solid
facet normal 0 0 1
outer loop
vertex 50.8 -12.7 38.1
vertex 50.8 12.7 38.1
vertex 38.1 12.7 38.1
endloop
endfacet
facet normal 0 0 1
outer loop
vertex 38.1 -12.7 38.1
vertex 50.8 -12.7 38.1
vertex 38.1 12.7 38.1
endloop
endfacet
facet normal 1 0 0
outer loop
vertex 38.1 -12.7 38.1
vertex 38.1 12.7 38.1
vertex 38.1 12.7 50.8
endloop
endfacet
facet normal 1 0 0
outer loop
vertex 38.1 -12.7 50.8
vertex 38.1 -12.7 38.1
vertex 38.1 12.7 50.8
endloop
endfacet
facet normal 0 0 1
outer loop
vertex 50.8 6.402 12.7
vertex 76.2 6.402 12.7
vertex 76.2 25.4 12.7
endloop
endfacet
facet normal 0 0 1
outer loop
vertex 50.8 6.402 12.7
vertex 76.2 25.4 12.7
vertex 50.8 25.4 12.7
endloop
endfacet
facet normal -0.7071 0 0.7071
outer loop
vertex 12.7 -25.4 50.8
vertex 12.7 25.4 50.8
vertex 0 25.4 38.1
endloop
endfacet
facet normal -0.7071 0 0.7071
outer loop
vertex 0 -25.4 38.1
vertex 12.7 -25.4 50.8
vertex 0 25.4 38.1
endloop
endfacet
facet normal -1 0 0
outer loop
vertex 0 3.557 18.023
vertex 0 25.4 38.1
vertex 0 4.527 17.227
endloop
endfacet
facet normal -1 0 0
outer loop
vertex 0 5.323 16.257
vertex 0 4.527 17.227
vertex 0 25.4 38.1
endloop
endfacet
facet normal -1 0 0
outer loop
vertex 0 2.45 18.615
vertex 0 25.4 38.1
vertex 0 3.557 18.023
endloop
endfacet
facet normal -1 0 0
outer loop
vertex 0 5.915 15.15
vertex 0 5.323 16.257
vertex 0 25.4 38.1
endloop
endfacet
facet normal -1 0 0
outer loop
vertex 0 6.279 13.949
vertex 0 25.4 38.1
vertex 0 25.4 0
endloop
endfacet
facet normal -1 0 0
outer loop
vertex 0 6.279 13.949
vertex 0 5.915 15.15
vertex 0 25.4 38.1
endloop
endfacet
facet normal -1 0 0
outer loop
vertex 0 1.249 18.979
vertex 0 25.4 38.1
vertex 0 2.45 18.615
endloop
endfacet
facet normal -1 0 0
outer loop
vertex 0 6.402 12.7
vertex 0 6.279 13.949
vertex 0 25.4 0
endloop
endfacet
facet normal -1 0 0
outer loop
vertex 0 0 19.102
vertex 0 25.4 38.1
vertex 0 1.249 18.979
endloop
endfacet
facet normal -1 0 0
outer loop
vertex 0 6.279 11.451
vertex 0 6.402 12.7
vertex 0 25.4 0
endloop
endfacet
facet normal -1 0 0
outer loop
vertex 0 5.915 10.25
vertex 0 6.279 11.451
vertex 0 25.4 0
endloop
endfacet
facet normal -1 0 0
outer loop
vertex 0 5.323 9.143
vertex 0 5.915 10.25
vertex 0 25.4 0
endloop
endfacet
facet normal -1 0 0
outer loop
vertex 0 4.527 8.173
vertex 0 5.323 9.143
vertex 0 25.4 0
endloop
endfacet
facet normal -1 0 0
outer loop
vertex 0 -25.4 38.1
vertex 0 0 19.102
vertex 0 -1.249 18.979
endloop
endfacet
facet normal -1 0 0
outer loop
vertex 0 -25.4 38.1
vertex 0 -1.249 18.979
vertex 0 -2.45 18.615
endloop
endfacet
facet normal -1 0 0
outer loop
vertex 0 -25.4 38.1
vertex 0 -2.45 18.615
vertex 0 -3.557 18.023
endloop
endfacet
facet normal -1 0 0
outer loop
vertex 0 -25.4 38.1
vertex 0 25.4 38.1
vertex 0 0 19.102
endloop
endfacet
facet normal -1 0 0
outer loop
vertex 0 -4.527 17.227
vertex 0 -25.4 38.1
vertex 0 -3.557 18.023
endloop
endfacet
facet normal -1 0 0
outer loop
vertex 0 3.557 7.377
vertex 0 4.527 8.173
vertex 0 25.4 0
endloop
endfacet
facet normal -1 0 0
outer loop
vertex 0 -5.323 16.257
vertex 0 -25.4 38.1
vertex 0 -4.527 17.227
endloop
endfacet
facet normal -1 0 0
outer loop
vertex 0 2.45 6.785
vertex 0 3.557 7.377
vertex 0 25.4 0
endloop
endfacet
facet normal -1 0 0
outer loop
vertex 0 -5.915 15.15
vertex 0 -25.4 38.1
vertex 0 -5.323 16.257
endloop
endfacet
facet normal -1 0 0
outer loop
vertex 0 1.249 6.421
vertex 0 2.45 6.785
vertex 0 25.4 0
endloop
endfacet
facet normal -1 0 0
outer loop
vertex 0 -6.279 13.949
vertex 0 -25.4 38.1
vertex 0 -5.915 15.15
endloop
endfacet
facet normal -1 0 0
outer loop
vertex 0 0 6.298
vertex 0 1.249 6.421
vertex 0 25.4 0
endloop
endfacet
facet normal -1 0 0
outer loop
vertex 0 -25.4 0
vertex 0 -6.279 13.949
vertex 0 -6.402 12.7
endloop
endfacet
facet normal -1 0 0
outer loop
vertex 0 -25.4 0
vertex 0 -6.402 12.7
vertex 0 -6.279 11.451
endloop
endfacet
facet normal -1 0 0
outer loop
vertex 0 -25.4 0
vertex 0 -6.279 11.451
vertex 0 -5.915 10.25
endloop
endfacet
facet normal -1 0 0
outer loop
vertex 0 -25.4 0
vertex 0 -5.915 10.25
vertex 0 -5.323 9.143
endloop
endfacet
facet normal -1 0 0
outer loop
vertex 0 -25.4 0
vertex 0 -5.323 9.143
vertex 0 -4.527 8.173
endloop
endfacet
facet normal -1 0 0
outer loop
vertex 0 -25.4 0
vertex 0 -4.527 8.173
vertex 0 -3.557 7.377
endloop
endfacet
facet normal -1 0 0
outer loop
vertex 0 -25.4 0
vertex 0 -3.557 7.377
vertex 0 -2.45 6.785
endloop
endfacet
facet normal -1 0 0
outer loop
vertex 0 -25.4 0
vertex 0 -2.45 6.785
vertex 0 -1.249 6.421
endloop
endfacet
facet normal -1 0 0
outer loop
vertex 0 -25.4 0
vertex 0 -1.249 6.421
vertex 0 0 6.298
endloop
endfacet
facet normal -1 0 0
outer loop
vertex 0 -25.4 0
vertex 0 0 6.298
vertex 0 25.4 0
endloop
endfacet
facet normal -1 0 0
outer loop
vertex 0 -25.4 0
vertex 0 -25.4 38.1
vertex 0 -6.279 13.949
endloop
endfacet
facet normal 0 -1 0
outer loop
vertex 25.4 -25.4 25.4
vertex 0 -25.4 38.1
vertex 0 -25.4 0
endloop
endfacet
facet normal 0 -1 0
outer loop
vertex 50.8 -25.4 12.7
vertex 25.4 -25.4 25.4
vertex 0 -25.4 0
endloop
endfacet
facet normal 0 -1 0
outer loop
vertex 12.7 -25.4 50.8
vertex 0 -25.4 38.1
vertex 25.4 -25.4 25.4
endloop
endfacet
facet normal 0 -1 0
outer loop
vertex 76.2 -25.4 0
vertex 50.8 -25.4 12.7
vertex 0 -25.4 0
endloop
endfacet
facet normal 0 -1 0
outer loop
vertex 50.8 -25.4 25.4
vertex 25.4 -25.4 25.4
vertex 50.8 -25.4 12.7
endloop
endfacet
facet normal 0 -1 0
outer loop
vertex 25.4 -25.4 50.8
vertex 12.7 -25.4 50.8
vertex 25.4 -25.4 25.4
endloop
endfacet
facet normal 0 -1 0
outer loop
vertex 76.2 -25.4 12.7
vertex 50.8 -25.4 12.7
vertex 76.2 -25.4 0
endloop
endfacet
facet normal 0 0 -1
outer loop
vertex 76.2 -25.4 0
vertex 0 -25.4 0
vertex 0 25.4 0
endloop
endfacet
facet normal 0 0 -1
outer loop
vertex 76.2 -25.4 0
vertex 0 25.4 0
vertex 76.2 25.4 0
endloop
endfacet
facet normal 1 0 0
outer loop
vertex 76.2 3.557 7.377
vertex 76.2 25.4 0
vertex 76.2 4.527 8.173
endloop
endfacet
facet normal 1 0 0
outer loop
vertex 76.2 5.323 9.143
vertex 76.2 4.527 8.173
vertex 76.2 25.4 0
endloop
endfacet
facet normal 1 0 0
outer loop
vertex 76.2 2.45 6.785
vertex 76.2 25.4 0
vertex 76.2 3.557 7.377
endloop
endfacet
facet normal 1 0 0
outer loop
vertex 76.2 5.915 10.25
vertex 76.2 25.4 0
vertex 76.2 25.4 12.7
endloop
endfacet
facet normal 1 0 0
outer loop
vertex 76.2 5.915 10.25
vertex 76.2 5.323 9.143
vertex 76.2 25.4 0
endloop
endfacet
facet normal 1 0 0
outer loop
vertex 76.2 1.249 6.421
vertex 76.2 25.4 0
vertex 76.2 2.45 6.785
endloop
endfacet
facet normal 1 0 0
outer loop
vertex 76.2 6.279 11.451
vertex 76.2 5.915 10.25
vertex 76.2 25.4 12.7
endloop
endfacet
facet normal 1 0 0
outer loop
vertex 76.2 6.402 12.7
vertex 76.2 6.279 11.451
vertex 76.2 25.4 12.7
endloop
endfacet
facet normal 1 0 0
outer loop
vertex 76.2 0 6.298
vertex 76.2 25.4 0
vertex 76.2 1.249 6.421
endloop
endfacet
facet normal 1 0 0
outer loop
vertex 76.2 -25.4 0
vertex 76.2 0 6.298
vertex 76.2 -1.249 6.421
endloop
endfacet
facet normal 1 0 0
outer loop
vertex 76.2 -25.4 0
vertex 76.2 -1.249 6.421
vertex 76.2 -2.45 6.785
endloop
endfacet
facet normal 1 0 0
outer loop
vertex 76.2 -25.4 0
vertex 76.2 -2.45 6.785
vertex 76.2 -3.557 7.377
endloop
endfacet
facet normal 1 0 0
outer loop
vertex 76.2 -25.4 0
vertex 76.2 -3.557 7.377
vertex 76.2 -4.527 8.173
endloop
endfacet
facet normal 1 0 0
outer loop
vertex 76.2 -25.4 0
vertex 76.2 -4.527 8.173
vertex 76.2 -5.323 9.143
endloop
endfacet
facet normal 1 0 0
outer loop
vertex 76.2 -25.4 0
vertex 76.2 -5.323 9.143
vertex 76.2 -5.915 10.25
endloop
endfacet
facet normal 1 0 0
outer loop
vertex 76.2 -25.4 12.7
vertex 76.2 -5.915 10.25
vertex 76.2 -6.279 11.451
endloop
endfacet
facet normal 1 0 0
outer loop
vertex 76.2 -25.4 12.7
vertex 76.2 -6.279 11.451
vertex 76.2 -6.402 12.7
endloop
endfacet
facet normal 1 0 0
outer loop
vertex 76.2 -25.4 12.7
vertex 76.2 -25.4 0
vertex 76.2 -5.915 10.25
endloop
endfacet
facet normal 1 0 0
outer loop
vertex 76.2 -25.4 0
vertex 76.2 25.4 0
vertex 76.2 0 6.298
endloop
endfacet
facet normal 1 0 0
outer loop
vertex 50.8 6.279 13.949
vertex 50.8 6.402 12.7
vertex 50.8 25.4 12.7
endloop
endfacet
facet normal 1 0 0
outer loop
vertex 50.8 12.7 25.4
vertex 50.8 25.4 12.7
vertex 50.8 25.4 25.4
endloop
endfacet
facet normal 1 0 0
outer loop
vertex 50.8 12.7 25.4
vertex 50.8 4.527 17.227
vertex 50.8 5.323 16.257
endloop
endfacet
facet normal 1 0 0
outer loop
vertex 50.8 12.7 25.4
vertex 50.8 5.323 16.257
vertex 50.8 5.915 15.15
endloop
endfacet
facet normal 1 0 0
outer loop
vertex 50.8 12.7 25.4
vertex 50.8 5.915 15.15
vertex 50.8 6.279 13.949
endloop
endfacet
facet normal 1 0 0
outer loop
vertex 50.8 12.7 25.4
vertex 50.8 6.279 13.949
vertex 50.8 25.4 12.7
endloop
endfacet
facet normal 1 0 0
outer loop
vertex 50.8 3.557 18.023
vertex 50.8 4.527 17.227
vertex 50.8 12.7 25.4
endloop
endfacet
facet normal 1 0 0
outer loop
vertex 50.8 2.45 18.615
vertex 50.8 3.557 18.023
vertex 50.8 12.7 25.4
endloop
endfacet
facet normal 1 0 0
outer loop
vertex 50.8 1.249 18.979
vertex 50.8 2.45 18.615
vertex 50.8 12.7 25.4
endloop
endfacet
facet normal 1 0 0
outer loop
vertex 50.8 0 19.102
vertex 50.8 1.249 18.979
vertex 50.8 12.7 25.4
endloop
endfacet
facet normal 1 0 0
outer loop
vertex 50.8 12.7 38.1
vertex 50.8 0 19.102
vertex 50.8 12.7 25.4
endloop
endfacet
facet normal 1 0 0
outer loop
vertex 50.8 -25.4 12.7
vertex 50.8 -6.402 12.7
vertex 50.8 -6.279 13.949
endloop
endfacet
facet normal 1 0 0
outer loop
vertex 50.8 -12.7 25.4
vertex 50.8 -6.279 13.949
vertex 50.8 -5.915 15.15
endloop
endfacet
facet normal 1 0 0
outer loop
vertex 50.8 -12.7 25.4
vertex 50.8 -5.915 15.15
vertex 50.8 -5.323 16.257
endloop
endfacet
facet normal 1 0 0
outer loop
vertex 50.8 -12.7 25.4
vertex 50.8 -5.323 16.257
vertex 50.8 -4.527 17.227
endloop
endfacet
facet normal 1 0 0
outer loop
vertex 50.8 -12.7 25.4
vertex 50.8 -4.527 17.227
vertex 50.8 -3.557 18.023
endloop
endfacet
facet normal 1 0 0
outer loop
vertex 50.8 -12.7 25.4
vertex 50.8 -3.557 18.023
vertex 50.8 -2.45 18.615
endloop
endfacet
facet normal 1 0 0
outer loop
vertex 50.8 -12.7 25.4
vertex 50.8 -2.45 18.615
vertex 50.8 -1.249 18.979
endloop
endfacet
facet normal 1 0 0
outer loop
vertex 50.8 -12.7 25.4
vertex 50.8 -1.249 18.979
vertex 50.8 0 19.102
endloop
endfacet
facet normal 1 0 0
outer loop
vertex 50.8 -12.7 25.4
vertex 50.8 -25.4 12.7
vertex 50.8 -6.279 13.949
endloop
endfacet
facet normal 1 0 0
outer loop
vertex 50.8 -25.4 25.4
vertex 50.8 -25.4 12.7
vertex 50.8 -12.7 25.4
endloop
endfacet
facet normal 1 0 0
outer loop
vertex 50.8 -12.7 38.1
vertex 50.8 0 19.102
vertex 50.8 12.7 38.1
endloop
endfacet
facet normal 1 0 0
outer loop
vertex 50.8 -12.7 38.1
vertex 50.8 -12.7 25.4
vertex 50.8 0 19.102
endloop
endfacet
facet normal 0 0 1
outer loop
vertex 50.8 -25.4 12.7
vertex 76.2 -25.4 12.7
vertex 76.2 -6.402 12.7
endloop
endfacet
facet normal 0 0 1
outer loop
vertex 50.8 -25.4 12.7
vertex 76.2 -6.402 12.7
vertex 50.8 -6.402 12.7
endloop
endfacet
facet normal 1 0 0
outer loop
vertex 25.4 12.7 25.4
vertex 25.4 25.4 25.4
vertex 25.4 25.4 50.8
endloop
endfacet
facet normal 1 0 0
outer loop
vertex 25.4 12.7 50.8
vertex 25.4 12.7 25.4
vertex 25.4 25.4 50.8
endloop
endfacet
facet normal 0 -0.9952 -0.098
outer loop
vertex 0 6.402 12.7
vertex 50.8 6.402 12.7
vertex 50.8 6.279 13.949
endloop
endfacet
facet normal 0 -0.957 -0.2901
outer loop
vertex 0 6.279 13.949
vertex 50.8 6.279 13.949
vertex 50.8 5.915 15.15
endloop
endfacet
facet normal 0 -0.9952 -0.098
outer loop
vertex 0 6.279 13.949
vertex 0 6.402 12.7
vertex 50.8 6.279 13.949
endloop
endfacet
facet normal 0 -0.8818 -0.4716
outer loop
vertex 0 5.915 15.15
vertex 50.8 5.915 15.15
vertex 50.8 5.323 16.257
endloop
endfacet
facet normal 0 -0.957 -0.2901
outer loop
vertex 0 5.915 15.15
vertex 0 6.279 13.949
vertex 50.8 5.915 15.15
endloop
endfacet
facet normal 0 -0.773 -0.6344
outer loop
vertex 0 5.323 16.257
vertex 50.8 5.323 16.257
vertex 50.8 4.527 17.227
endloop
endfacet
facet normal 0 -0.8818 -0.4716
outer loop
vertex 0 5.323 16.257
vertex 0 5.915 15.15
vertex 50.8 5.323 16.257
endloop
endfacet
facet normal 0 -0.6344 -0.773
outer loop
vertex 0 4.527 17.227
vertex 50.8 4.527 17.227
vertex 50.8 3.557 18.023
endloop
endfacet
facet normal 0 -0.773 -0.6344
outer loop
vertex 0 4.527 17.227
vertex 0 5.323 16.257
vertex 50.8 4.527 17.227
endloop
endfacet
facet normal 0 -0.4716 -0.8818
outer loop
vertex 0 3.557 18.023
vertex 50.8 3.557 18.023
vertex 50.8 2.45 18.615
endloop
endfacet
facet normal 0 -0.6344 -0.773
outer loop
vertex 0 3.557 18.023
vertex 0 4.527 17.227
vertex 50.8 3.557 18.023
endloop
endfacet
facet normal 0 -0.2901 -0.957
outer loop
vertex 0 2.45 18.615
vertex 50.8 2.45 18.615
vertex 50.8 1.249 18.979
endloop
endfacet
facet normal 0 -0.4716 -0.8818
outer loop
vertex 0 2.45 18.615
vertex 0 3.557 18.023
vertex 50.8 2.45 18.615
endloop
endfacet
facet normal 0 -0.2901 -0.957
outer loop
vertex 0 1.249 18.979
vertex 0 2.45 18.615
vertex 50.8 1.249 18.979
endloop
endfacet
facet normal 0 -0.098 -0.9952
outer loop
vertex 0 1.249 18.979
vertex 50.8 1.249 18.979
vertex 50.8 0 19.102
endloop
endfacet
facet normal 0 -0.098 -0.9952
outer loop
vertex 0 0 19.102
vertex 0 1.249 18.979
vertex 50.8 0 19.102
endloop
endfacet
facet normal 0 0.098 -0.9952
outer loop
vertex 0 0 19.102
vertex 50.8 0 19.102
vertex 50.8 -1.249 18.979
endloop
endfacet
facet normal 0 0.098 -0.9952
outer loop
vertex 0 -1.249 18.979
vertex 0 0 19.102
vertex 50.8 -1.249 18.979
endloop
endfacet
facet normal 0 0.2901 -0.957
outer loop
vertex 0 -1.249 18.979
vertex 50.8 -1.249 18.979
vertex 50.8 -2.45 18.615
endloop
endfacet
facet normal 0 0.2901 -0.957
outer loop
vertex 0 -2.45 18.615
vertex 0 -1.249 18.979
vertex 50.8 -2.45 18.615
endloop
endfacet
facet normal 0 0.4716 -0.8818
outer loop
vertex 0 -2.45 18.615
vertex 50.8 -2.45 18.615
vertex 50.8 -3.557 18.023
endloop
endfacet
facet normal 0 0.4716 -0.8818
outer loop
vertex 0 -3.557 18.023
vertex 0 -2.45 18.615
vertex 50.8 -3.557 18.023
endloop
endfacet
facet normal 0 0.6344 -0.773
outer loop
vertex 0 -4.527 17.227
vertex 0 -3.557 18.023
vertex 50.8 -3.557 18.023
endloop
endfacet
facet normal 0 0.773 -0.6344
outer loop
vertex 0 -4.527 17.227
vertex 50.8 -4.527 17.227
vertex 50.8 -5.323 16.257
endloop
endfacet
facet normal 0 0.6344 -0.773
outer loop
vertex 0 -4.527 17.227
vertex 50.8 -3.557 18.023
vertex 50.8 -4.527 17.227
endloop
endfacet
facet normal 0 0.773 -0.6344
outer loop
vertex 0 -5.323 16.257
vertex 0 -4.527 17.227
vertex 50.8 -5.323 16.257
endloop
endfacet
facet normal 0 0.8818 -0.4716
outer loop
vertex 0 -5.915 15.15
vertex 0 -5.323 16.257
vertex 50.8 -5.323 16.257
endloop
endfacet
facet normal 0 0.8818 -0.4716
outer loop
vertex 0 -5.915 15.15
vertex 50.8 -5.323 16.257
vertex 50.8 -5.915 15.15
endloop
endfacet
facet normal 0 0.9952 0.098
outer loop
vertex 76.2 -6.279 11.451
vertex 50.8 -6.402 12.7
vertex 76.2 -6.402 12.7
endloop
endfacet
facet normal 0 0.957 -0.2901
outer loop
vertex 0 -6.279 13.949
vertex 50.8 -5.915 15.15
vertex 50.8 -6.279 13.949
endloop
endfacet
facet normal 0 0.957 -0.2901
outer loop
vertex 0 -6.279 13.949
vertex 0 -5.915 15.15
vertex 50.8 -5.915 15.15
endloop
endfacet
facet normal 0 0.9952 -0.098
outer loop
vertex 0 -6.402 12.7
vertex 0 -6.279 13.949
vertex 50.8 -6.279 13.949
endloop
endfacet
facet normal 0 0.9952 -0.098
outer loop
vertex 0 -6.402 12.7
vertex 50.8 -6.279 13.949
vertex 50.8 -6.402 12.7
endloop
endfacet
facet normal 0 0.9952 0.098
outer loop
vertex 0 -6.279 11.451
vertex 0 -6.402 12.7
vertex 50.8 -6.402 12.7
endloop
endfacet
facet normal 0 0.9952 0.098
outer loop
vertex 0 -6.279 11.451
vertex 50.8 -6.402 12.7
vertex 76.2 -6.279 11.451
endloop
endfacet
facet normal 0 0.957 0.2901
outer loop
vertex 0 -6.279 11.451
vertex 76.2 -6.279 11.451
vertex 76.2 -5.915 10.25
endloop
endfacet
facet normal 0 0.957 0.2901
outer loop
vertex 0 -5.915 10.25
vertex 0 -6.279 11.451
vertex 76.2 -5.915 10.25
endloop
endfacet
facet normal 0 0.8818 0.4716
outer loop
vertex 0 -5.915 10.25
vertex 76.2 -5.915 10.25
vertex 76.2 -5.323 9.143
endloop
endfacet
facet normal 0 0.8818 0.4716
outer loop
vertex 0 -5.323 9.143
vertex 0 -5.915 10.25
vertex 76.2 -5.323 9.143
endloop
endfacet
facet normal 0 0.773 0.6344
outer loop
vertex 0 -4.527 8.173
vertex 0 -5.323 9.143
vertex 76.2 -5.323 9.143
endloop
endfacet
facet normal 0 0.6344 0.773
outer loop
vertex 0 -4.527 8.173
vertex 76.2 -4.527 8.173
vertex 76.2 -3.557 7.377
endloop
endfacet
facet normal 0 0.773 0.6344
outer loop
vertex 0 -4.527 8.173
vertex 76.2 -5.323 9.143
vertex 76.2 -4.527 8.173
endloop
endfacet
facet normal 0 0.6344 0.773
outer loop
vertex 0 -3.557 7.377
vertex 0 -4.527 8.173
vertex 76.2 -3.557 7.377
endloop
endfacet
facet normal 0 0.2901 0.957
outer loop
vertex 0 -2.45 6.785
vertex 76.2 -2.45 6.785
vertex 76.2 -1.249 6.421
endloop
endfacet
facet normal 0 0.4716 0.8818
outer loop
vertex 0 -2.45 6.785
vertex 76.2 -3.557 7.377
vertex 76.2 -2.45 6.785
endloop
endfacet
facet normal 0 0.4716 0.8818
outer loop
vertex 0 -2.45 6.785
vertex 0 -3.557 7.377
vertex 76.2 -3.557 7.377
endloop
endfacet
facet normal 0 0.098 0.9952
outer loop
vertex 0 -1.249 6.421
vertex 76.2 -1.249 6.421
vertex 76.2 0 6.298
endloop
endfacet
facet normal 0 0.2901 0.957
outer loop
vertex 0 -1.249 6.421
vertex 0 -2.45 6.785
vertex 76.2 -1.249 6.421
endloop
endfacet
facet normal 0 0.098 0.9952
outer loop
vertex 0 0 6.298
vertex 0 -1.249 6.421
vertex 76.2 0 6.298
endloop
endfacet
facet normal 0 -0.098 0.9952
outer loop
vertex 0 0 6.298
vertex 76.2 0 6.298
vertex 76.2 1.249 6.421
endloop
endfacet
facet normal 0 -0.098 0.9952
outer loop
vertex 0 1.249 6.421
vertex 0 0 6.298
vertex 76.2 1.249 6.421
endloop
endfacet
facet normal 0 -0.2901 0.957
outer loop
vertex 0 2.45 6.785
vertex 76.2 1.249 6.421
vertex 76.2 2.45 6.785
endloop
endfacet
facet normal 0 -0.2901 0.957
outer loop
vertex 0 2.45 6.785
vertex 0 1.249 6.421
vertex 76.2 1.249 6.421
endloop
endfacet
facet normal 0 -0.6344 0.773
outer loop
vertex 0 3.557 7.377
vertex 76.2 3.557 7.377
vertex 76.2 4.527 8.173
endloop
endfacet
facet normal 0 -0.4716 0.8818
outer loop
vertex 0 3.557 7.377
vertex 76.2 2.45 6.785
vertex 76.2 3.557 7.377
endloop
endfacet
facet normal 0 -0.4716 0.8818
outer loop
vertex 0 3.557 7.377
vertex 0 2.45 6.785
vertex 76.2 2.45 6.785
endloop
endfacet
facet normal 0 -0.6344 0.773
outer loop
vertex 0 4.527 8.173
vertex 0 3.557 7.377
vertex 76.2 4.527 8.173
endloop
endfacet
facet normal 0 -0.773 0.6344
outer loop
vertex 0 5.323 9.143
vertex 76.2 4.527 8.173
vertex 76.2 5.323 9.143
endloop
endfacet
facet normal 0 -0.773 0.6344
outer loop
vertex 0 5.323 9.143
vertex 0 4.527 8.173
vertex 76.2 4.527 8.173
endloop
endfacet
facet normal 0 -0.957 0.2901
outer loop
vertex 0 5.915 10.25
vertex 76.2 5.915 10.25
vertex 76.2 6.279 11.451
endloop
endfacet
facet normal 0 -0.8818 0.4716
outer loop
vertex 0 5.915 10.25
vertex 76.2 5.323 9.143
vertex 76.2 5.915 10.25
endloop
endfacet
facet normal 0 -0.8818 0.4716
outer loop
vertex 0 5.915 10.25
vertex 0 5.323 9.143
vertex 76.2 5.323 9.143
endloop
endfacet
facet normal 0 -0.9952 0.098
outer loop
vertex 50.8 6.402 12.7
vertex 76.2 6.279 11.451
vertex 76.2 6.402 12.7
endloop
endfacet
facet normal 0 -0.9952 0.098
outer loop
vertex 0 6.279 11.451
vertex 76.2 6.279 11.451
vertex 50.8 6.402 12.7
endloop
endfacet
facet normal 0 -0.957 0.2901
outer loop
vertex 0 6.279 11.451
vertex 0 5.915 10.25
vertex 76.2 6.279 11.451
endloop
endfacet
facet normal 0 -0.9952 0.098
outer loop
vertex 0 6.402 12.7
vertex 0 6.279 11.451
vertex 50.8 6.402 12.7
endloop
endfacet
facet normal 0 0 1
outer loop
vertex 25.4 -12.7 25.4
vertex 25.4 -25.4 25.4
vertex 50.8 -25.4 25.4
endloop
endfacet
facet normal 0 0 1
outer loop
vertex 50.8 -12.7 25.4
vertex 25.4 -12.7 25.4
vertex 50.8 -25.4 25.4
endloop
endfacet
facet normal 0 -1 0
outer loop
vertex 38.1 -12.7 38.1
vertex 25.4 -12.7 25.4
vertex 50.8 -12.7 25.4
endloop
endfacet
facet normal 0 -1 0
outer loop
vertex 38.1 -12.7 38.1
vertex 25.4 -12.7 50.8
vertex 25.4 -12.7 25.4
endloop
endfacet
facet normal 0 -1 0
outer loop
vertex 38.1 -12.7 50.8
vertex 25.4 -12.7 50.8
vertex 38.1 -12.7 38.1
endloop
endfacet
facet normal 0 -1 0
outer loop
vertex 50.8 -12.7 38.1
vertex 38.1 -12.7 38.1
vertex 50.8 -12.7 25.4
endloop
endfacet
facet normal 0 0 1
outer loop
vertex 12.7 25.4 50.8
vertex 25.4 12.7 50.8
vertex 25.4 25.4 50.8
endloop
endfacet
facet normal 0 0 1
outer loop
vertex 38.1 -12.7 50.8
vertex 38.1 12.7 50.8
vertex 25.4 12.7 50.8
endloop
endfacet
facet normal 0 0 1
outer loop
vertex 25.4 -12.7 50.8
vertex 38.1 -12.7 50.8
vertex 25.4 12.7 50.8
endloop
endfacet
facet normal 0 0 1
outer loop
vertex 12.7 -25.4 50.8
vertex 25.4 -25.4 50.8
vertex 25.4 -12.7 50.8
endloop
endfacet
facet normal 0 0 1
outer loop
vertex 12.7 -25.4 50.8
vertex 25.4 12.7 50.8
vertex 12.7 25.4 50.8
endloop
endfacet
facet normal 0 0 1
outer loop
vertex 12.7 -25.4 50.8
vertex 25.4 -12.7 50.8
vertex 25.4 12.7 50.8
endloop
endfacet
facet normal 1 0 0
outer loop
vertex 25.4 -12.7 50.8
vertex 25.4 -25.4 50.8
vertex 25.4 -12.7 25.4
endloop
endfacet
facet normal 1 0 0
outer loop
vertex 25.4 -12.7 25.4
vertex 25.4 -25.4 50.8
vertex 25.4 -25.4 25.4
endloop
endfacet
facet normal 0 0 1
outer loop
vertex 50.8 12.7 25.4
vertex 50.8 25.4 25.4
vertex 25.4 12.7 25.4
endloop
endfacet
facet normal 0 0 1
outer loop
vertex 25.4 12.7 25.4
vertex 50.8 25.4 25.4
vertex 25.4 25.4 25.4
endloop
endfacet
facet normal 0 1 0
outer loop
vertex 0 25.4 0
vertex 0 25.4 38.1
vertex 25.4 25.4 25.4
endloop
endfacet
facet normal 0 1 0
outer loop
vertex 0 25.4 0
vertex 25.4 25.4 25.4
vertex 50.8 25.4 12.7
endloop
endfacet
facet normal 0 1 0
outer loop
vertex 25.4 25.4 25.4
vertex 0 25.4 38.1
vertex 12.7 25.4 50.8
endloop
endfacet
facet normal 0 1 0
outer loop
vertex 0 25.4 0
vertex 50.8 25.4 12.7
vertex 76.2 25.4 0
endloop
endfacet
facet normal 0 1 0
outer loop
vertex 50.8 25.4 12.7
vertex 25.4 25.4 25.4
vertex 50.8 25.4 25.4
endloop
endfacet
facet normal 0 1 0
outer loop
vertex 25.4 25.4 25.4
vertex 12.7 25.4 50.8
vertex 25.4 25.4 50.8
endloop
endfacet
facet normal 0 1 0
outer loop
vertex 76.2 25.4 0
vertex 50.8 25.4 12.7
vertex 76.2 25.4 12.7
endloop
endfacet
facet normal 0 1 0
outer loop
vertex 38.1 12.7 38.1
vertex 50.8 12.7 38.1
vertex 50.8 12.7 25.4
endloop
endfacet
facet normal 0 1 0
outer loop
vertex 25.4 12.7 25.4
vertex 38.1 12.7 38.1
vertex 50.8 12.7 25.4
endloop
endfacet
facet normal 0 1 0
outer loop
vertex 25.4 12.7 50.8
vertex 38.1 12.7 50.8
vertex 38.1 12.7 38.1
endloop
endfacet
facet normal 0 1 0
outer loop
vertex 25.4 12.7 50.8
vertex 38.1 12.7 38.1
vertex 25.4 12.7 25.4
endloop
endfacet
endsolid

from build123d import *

# Parameters (mm, degrees)
F1_DEPTH = 25.4
F3_DEPTH = 12.7
F5_DEPTH = 12.7
F6_R     = 6.4018672909
F7_DEPTH = 76.201


with BuildPart() as f1:
    # F0 (on Front) → F1 (new body, symmetric)
    with BuildSketch(Plane.XZ):
        Polygon((0, 38.1), (0, 0), (76.2, 0), (76.2, 12.7), (50.8, 12.7), (50.8, 38.1), (38.1, 38.1), (38.1, 50.8), (12.7, 50.8), align=None)
    extrude(amount=F1_DEPTH, both=True)

    # F2 (on face) → F3 (cut)
    with BuildSketch(Plane.XZ.offset(25.4)):
        Polygon((25.4, 25.4), (50.8, 25.4), (50.8, 38.1), (38.1, 38.1), (38.1, 50.8), (25.4, 50.8), align=None)
    extrude(amount=-F3_DEPTH, mode=Mode.SUBTRACT)

    # F4 (on face) → F5 (cut)
    with BuildSketch(Plane(origin=(0, 25.4, 0), x_dir=(-1, 0, 0), z_dir=(0, 1, 0))):
        Polygon((-50.8, 38.1), (-50.8, 25.4), (-25.4, 25.4), (-25.4, 50.8), (-38.1, 50.8), (-38.1, 38.1), align=None)
    extrude(amount=-F5_DEPTH, mode=Mode.SUBTRACT)

    # F6 (on Right) → F7 (cut, through all)
    with BuildSketch(Plane.YZ):
        with Locations((0, 12.7)):
            Circle(F6_R)
    extrude(amount=F7_DEPTH, mode=Mode.SUBTRACT)


solid = f1.part
